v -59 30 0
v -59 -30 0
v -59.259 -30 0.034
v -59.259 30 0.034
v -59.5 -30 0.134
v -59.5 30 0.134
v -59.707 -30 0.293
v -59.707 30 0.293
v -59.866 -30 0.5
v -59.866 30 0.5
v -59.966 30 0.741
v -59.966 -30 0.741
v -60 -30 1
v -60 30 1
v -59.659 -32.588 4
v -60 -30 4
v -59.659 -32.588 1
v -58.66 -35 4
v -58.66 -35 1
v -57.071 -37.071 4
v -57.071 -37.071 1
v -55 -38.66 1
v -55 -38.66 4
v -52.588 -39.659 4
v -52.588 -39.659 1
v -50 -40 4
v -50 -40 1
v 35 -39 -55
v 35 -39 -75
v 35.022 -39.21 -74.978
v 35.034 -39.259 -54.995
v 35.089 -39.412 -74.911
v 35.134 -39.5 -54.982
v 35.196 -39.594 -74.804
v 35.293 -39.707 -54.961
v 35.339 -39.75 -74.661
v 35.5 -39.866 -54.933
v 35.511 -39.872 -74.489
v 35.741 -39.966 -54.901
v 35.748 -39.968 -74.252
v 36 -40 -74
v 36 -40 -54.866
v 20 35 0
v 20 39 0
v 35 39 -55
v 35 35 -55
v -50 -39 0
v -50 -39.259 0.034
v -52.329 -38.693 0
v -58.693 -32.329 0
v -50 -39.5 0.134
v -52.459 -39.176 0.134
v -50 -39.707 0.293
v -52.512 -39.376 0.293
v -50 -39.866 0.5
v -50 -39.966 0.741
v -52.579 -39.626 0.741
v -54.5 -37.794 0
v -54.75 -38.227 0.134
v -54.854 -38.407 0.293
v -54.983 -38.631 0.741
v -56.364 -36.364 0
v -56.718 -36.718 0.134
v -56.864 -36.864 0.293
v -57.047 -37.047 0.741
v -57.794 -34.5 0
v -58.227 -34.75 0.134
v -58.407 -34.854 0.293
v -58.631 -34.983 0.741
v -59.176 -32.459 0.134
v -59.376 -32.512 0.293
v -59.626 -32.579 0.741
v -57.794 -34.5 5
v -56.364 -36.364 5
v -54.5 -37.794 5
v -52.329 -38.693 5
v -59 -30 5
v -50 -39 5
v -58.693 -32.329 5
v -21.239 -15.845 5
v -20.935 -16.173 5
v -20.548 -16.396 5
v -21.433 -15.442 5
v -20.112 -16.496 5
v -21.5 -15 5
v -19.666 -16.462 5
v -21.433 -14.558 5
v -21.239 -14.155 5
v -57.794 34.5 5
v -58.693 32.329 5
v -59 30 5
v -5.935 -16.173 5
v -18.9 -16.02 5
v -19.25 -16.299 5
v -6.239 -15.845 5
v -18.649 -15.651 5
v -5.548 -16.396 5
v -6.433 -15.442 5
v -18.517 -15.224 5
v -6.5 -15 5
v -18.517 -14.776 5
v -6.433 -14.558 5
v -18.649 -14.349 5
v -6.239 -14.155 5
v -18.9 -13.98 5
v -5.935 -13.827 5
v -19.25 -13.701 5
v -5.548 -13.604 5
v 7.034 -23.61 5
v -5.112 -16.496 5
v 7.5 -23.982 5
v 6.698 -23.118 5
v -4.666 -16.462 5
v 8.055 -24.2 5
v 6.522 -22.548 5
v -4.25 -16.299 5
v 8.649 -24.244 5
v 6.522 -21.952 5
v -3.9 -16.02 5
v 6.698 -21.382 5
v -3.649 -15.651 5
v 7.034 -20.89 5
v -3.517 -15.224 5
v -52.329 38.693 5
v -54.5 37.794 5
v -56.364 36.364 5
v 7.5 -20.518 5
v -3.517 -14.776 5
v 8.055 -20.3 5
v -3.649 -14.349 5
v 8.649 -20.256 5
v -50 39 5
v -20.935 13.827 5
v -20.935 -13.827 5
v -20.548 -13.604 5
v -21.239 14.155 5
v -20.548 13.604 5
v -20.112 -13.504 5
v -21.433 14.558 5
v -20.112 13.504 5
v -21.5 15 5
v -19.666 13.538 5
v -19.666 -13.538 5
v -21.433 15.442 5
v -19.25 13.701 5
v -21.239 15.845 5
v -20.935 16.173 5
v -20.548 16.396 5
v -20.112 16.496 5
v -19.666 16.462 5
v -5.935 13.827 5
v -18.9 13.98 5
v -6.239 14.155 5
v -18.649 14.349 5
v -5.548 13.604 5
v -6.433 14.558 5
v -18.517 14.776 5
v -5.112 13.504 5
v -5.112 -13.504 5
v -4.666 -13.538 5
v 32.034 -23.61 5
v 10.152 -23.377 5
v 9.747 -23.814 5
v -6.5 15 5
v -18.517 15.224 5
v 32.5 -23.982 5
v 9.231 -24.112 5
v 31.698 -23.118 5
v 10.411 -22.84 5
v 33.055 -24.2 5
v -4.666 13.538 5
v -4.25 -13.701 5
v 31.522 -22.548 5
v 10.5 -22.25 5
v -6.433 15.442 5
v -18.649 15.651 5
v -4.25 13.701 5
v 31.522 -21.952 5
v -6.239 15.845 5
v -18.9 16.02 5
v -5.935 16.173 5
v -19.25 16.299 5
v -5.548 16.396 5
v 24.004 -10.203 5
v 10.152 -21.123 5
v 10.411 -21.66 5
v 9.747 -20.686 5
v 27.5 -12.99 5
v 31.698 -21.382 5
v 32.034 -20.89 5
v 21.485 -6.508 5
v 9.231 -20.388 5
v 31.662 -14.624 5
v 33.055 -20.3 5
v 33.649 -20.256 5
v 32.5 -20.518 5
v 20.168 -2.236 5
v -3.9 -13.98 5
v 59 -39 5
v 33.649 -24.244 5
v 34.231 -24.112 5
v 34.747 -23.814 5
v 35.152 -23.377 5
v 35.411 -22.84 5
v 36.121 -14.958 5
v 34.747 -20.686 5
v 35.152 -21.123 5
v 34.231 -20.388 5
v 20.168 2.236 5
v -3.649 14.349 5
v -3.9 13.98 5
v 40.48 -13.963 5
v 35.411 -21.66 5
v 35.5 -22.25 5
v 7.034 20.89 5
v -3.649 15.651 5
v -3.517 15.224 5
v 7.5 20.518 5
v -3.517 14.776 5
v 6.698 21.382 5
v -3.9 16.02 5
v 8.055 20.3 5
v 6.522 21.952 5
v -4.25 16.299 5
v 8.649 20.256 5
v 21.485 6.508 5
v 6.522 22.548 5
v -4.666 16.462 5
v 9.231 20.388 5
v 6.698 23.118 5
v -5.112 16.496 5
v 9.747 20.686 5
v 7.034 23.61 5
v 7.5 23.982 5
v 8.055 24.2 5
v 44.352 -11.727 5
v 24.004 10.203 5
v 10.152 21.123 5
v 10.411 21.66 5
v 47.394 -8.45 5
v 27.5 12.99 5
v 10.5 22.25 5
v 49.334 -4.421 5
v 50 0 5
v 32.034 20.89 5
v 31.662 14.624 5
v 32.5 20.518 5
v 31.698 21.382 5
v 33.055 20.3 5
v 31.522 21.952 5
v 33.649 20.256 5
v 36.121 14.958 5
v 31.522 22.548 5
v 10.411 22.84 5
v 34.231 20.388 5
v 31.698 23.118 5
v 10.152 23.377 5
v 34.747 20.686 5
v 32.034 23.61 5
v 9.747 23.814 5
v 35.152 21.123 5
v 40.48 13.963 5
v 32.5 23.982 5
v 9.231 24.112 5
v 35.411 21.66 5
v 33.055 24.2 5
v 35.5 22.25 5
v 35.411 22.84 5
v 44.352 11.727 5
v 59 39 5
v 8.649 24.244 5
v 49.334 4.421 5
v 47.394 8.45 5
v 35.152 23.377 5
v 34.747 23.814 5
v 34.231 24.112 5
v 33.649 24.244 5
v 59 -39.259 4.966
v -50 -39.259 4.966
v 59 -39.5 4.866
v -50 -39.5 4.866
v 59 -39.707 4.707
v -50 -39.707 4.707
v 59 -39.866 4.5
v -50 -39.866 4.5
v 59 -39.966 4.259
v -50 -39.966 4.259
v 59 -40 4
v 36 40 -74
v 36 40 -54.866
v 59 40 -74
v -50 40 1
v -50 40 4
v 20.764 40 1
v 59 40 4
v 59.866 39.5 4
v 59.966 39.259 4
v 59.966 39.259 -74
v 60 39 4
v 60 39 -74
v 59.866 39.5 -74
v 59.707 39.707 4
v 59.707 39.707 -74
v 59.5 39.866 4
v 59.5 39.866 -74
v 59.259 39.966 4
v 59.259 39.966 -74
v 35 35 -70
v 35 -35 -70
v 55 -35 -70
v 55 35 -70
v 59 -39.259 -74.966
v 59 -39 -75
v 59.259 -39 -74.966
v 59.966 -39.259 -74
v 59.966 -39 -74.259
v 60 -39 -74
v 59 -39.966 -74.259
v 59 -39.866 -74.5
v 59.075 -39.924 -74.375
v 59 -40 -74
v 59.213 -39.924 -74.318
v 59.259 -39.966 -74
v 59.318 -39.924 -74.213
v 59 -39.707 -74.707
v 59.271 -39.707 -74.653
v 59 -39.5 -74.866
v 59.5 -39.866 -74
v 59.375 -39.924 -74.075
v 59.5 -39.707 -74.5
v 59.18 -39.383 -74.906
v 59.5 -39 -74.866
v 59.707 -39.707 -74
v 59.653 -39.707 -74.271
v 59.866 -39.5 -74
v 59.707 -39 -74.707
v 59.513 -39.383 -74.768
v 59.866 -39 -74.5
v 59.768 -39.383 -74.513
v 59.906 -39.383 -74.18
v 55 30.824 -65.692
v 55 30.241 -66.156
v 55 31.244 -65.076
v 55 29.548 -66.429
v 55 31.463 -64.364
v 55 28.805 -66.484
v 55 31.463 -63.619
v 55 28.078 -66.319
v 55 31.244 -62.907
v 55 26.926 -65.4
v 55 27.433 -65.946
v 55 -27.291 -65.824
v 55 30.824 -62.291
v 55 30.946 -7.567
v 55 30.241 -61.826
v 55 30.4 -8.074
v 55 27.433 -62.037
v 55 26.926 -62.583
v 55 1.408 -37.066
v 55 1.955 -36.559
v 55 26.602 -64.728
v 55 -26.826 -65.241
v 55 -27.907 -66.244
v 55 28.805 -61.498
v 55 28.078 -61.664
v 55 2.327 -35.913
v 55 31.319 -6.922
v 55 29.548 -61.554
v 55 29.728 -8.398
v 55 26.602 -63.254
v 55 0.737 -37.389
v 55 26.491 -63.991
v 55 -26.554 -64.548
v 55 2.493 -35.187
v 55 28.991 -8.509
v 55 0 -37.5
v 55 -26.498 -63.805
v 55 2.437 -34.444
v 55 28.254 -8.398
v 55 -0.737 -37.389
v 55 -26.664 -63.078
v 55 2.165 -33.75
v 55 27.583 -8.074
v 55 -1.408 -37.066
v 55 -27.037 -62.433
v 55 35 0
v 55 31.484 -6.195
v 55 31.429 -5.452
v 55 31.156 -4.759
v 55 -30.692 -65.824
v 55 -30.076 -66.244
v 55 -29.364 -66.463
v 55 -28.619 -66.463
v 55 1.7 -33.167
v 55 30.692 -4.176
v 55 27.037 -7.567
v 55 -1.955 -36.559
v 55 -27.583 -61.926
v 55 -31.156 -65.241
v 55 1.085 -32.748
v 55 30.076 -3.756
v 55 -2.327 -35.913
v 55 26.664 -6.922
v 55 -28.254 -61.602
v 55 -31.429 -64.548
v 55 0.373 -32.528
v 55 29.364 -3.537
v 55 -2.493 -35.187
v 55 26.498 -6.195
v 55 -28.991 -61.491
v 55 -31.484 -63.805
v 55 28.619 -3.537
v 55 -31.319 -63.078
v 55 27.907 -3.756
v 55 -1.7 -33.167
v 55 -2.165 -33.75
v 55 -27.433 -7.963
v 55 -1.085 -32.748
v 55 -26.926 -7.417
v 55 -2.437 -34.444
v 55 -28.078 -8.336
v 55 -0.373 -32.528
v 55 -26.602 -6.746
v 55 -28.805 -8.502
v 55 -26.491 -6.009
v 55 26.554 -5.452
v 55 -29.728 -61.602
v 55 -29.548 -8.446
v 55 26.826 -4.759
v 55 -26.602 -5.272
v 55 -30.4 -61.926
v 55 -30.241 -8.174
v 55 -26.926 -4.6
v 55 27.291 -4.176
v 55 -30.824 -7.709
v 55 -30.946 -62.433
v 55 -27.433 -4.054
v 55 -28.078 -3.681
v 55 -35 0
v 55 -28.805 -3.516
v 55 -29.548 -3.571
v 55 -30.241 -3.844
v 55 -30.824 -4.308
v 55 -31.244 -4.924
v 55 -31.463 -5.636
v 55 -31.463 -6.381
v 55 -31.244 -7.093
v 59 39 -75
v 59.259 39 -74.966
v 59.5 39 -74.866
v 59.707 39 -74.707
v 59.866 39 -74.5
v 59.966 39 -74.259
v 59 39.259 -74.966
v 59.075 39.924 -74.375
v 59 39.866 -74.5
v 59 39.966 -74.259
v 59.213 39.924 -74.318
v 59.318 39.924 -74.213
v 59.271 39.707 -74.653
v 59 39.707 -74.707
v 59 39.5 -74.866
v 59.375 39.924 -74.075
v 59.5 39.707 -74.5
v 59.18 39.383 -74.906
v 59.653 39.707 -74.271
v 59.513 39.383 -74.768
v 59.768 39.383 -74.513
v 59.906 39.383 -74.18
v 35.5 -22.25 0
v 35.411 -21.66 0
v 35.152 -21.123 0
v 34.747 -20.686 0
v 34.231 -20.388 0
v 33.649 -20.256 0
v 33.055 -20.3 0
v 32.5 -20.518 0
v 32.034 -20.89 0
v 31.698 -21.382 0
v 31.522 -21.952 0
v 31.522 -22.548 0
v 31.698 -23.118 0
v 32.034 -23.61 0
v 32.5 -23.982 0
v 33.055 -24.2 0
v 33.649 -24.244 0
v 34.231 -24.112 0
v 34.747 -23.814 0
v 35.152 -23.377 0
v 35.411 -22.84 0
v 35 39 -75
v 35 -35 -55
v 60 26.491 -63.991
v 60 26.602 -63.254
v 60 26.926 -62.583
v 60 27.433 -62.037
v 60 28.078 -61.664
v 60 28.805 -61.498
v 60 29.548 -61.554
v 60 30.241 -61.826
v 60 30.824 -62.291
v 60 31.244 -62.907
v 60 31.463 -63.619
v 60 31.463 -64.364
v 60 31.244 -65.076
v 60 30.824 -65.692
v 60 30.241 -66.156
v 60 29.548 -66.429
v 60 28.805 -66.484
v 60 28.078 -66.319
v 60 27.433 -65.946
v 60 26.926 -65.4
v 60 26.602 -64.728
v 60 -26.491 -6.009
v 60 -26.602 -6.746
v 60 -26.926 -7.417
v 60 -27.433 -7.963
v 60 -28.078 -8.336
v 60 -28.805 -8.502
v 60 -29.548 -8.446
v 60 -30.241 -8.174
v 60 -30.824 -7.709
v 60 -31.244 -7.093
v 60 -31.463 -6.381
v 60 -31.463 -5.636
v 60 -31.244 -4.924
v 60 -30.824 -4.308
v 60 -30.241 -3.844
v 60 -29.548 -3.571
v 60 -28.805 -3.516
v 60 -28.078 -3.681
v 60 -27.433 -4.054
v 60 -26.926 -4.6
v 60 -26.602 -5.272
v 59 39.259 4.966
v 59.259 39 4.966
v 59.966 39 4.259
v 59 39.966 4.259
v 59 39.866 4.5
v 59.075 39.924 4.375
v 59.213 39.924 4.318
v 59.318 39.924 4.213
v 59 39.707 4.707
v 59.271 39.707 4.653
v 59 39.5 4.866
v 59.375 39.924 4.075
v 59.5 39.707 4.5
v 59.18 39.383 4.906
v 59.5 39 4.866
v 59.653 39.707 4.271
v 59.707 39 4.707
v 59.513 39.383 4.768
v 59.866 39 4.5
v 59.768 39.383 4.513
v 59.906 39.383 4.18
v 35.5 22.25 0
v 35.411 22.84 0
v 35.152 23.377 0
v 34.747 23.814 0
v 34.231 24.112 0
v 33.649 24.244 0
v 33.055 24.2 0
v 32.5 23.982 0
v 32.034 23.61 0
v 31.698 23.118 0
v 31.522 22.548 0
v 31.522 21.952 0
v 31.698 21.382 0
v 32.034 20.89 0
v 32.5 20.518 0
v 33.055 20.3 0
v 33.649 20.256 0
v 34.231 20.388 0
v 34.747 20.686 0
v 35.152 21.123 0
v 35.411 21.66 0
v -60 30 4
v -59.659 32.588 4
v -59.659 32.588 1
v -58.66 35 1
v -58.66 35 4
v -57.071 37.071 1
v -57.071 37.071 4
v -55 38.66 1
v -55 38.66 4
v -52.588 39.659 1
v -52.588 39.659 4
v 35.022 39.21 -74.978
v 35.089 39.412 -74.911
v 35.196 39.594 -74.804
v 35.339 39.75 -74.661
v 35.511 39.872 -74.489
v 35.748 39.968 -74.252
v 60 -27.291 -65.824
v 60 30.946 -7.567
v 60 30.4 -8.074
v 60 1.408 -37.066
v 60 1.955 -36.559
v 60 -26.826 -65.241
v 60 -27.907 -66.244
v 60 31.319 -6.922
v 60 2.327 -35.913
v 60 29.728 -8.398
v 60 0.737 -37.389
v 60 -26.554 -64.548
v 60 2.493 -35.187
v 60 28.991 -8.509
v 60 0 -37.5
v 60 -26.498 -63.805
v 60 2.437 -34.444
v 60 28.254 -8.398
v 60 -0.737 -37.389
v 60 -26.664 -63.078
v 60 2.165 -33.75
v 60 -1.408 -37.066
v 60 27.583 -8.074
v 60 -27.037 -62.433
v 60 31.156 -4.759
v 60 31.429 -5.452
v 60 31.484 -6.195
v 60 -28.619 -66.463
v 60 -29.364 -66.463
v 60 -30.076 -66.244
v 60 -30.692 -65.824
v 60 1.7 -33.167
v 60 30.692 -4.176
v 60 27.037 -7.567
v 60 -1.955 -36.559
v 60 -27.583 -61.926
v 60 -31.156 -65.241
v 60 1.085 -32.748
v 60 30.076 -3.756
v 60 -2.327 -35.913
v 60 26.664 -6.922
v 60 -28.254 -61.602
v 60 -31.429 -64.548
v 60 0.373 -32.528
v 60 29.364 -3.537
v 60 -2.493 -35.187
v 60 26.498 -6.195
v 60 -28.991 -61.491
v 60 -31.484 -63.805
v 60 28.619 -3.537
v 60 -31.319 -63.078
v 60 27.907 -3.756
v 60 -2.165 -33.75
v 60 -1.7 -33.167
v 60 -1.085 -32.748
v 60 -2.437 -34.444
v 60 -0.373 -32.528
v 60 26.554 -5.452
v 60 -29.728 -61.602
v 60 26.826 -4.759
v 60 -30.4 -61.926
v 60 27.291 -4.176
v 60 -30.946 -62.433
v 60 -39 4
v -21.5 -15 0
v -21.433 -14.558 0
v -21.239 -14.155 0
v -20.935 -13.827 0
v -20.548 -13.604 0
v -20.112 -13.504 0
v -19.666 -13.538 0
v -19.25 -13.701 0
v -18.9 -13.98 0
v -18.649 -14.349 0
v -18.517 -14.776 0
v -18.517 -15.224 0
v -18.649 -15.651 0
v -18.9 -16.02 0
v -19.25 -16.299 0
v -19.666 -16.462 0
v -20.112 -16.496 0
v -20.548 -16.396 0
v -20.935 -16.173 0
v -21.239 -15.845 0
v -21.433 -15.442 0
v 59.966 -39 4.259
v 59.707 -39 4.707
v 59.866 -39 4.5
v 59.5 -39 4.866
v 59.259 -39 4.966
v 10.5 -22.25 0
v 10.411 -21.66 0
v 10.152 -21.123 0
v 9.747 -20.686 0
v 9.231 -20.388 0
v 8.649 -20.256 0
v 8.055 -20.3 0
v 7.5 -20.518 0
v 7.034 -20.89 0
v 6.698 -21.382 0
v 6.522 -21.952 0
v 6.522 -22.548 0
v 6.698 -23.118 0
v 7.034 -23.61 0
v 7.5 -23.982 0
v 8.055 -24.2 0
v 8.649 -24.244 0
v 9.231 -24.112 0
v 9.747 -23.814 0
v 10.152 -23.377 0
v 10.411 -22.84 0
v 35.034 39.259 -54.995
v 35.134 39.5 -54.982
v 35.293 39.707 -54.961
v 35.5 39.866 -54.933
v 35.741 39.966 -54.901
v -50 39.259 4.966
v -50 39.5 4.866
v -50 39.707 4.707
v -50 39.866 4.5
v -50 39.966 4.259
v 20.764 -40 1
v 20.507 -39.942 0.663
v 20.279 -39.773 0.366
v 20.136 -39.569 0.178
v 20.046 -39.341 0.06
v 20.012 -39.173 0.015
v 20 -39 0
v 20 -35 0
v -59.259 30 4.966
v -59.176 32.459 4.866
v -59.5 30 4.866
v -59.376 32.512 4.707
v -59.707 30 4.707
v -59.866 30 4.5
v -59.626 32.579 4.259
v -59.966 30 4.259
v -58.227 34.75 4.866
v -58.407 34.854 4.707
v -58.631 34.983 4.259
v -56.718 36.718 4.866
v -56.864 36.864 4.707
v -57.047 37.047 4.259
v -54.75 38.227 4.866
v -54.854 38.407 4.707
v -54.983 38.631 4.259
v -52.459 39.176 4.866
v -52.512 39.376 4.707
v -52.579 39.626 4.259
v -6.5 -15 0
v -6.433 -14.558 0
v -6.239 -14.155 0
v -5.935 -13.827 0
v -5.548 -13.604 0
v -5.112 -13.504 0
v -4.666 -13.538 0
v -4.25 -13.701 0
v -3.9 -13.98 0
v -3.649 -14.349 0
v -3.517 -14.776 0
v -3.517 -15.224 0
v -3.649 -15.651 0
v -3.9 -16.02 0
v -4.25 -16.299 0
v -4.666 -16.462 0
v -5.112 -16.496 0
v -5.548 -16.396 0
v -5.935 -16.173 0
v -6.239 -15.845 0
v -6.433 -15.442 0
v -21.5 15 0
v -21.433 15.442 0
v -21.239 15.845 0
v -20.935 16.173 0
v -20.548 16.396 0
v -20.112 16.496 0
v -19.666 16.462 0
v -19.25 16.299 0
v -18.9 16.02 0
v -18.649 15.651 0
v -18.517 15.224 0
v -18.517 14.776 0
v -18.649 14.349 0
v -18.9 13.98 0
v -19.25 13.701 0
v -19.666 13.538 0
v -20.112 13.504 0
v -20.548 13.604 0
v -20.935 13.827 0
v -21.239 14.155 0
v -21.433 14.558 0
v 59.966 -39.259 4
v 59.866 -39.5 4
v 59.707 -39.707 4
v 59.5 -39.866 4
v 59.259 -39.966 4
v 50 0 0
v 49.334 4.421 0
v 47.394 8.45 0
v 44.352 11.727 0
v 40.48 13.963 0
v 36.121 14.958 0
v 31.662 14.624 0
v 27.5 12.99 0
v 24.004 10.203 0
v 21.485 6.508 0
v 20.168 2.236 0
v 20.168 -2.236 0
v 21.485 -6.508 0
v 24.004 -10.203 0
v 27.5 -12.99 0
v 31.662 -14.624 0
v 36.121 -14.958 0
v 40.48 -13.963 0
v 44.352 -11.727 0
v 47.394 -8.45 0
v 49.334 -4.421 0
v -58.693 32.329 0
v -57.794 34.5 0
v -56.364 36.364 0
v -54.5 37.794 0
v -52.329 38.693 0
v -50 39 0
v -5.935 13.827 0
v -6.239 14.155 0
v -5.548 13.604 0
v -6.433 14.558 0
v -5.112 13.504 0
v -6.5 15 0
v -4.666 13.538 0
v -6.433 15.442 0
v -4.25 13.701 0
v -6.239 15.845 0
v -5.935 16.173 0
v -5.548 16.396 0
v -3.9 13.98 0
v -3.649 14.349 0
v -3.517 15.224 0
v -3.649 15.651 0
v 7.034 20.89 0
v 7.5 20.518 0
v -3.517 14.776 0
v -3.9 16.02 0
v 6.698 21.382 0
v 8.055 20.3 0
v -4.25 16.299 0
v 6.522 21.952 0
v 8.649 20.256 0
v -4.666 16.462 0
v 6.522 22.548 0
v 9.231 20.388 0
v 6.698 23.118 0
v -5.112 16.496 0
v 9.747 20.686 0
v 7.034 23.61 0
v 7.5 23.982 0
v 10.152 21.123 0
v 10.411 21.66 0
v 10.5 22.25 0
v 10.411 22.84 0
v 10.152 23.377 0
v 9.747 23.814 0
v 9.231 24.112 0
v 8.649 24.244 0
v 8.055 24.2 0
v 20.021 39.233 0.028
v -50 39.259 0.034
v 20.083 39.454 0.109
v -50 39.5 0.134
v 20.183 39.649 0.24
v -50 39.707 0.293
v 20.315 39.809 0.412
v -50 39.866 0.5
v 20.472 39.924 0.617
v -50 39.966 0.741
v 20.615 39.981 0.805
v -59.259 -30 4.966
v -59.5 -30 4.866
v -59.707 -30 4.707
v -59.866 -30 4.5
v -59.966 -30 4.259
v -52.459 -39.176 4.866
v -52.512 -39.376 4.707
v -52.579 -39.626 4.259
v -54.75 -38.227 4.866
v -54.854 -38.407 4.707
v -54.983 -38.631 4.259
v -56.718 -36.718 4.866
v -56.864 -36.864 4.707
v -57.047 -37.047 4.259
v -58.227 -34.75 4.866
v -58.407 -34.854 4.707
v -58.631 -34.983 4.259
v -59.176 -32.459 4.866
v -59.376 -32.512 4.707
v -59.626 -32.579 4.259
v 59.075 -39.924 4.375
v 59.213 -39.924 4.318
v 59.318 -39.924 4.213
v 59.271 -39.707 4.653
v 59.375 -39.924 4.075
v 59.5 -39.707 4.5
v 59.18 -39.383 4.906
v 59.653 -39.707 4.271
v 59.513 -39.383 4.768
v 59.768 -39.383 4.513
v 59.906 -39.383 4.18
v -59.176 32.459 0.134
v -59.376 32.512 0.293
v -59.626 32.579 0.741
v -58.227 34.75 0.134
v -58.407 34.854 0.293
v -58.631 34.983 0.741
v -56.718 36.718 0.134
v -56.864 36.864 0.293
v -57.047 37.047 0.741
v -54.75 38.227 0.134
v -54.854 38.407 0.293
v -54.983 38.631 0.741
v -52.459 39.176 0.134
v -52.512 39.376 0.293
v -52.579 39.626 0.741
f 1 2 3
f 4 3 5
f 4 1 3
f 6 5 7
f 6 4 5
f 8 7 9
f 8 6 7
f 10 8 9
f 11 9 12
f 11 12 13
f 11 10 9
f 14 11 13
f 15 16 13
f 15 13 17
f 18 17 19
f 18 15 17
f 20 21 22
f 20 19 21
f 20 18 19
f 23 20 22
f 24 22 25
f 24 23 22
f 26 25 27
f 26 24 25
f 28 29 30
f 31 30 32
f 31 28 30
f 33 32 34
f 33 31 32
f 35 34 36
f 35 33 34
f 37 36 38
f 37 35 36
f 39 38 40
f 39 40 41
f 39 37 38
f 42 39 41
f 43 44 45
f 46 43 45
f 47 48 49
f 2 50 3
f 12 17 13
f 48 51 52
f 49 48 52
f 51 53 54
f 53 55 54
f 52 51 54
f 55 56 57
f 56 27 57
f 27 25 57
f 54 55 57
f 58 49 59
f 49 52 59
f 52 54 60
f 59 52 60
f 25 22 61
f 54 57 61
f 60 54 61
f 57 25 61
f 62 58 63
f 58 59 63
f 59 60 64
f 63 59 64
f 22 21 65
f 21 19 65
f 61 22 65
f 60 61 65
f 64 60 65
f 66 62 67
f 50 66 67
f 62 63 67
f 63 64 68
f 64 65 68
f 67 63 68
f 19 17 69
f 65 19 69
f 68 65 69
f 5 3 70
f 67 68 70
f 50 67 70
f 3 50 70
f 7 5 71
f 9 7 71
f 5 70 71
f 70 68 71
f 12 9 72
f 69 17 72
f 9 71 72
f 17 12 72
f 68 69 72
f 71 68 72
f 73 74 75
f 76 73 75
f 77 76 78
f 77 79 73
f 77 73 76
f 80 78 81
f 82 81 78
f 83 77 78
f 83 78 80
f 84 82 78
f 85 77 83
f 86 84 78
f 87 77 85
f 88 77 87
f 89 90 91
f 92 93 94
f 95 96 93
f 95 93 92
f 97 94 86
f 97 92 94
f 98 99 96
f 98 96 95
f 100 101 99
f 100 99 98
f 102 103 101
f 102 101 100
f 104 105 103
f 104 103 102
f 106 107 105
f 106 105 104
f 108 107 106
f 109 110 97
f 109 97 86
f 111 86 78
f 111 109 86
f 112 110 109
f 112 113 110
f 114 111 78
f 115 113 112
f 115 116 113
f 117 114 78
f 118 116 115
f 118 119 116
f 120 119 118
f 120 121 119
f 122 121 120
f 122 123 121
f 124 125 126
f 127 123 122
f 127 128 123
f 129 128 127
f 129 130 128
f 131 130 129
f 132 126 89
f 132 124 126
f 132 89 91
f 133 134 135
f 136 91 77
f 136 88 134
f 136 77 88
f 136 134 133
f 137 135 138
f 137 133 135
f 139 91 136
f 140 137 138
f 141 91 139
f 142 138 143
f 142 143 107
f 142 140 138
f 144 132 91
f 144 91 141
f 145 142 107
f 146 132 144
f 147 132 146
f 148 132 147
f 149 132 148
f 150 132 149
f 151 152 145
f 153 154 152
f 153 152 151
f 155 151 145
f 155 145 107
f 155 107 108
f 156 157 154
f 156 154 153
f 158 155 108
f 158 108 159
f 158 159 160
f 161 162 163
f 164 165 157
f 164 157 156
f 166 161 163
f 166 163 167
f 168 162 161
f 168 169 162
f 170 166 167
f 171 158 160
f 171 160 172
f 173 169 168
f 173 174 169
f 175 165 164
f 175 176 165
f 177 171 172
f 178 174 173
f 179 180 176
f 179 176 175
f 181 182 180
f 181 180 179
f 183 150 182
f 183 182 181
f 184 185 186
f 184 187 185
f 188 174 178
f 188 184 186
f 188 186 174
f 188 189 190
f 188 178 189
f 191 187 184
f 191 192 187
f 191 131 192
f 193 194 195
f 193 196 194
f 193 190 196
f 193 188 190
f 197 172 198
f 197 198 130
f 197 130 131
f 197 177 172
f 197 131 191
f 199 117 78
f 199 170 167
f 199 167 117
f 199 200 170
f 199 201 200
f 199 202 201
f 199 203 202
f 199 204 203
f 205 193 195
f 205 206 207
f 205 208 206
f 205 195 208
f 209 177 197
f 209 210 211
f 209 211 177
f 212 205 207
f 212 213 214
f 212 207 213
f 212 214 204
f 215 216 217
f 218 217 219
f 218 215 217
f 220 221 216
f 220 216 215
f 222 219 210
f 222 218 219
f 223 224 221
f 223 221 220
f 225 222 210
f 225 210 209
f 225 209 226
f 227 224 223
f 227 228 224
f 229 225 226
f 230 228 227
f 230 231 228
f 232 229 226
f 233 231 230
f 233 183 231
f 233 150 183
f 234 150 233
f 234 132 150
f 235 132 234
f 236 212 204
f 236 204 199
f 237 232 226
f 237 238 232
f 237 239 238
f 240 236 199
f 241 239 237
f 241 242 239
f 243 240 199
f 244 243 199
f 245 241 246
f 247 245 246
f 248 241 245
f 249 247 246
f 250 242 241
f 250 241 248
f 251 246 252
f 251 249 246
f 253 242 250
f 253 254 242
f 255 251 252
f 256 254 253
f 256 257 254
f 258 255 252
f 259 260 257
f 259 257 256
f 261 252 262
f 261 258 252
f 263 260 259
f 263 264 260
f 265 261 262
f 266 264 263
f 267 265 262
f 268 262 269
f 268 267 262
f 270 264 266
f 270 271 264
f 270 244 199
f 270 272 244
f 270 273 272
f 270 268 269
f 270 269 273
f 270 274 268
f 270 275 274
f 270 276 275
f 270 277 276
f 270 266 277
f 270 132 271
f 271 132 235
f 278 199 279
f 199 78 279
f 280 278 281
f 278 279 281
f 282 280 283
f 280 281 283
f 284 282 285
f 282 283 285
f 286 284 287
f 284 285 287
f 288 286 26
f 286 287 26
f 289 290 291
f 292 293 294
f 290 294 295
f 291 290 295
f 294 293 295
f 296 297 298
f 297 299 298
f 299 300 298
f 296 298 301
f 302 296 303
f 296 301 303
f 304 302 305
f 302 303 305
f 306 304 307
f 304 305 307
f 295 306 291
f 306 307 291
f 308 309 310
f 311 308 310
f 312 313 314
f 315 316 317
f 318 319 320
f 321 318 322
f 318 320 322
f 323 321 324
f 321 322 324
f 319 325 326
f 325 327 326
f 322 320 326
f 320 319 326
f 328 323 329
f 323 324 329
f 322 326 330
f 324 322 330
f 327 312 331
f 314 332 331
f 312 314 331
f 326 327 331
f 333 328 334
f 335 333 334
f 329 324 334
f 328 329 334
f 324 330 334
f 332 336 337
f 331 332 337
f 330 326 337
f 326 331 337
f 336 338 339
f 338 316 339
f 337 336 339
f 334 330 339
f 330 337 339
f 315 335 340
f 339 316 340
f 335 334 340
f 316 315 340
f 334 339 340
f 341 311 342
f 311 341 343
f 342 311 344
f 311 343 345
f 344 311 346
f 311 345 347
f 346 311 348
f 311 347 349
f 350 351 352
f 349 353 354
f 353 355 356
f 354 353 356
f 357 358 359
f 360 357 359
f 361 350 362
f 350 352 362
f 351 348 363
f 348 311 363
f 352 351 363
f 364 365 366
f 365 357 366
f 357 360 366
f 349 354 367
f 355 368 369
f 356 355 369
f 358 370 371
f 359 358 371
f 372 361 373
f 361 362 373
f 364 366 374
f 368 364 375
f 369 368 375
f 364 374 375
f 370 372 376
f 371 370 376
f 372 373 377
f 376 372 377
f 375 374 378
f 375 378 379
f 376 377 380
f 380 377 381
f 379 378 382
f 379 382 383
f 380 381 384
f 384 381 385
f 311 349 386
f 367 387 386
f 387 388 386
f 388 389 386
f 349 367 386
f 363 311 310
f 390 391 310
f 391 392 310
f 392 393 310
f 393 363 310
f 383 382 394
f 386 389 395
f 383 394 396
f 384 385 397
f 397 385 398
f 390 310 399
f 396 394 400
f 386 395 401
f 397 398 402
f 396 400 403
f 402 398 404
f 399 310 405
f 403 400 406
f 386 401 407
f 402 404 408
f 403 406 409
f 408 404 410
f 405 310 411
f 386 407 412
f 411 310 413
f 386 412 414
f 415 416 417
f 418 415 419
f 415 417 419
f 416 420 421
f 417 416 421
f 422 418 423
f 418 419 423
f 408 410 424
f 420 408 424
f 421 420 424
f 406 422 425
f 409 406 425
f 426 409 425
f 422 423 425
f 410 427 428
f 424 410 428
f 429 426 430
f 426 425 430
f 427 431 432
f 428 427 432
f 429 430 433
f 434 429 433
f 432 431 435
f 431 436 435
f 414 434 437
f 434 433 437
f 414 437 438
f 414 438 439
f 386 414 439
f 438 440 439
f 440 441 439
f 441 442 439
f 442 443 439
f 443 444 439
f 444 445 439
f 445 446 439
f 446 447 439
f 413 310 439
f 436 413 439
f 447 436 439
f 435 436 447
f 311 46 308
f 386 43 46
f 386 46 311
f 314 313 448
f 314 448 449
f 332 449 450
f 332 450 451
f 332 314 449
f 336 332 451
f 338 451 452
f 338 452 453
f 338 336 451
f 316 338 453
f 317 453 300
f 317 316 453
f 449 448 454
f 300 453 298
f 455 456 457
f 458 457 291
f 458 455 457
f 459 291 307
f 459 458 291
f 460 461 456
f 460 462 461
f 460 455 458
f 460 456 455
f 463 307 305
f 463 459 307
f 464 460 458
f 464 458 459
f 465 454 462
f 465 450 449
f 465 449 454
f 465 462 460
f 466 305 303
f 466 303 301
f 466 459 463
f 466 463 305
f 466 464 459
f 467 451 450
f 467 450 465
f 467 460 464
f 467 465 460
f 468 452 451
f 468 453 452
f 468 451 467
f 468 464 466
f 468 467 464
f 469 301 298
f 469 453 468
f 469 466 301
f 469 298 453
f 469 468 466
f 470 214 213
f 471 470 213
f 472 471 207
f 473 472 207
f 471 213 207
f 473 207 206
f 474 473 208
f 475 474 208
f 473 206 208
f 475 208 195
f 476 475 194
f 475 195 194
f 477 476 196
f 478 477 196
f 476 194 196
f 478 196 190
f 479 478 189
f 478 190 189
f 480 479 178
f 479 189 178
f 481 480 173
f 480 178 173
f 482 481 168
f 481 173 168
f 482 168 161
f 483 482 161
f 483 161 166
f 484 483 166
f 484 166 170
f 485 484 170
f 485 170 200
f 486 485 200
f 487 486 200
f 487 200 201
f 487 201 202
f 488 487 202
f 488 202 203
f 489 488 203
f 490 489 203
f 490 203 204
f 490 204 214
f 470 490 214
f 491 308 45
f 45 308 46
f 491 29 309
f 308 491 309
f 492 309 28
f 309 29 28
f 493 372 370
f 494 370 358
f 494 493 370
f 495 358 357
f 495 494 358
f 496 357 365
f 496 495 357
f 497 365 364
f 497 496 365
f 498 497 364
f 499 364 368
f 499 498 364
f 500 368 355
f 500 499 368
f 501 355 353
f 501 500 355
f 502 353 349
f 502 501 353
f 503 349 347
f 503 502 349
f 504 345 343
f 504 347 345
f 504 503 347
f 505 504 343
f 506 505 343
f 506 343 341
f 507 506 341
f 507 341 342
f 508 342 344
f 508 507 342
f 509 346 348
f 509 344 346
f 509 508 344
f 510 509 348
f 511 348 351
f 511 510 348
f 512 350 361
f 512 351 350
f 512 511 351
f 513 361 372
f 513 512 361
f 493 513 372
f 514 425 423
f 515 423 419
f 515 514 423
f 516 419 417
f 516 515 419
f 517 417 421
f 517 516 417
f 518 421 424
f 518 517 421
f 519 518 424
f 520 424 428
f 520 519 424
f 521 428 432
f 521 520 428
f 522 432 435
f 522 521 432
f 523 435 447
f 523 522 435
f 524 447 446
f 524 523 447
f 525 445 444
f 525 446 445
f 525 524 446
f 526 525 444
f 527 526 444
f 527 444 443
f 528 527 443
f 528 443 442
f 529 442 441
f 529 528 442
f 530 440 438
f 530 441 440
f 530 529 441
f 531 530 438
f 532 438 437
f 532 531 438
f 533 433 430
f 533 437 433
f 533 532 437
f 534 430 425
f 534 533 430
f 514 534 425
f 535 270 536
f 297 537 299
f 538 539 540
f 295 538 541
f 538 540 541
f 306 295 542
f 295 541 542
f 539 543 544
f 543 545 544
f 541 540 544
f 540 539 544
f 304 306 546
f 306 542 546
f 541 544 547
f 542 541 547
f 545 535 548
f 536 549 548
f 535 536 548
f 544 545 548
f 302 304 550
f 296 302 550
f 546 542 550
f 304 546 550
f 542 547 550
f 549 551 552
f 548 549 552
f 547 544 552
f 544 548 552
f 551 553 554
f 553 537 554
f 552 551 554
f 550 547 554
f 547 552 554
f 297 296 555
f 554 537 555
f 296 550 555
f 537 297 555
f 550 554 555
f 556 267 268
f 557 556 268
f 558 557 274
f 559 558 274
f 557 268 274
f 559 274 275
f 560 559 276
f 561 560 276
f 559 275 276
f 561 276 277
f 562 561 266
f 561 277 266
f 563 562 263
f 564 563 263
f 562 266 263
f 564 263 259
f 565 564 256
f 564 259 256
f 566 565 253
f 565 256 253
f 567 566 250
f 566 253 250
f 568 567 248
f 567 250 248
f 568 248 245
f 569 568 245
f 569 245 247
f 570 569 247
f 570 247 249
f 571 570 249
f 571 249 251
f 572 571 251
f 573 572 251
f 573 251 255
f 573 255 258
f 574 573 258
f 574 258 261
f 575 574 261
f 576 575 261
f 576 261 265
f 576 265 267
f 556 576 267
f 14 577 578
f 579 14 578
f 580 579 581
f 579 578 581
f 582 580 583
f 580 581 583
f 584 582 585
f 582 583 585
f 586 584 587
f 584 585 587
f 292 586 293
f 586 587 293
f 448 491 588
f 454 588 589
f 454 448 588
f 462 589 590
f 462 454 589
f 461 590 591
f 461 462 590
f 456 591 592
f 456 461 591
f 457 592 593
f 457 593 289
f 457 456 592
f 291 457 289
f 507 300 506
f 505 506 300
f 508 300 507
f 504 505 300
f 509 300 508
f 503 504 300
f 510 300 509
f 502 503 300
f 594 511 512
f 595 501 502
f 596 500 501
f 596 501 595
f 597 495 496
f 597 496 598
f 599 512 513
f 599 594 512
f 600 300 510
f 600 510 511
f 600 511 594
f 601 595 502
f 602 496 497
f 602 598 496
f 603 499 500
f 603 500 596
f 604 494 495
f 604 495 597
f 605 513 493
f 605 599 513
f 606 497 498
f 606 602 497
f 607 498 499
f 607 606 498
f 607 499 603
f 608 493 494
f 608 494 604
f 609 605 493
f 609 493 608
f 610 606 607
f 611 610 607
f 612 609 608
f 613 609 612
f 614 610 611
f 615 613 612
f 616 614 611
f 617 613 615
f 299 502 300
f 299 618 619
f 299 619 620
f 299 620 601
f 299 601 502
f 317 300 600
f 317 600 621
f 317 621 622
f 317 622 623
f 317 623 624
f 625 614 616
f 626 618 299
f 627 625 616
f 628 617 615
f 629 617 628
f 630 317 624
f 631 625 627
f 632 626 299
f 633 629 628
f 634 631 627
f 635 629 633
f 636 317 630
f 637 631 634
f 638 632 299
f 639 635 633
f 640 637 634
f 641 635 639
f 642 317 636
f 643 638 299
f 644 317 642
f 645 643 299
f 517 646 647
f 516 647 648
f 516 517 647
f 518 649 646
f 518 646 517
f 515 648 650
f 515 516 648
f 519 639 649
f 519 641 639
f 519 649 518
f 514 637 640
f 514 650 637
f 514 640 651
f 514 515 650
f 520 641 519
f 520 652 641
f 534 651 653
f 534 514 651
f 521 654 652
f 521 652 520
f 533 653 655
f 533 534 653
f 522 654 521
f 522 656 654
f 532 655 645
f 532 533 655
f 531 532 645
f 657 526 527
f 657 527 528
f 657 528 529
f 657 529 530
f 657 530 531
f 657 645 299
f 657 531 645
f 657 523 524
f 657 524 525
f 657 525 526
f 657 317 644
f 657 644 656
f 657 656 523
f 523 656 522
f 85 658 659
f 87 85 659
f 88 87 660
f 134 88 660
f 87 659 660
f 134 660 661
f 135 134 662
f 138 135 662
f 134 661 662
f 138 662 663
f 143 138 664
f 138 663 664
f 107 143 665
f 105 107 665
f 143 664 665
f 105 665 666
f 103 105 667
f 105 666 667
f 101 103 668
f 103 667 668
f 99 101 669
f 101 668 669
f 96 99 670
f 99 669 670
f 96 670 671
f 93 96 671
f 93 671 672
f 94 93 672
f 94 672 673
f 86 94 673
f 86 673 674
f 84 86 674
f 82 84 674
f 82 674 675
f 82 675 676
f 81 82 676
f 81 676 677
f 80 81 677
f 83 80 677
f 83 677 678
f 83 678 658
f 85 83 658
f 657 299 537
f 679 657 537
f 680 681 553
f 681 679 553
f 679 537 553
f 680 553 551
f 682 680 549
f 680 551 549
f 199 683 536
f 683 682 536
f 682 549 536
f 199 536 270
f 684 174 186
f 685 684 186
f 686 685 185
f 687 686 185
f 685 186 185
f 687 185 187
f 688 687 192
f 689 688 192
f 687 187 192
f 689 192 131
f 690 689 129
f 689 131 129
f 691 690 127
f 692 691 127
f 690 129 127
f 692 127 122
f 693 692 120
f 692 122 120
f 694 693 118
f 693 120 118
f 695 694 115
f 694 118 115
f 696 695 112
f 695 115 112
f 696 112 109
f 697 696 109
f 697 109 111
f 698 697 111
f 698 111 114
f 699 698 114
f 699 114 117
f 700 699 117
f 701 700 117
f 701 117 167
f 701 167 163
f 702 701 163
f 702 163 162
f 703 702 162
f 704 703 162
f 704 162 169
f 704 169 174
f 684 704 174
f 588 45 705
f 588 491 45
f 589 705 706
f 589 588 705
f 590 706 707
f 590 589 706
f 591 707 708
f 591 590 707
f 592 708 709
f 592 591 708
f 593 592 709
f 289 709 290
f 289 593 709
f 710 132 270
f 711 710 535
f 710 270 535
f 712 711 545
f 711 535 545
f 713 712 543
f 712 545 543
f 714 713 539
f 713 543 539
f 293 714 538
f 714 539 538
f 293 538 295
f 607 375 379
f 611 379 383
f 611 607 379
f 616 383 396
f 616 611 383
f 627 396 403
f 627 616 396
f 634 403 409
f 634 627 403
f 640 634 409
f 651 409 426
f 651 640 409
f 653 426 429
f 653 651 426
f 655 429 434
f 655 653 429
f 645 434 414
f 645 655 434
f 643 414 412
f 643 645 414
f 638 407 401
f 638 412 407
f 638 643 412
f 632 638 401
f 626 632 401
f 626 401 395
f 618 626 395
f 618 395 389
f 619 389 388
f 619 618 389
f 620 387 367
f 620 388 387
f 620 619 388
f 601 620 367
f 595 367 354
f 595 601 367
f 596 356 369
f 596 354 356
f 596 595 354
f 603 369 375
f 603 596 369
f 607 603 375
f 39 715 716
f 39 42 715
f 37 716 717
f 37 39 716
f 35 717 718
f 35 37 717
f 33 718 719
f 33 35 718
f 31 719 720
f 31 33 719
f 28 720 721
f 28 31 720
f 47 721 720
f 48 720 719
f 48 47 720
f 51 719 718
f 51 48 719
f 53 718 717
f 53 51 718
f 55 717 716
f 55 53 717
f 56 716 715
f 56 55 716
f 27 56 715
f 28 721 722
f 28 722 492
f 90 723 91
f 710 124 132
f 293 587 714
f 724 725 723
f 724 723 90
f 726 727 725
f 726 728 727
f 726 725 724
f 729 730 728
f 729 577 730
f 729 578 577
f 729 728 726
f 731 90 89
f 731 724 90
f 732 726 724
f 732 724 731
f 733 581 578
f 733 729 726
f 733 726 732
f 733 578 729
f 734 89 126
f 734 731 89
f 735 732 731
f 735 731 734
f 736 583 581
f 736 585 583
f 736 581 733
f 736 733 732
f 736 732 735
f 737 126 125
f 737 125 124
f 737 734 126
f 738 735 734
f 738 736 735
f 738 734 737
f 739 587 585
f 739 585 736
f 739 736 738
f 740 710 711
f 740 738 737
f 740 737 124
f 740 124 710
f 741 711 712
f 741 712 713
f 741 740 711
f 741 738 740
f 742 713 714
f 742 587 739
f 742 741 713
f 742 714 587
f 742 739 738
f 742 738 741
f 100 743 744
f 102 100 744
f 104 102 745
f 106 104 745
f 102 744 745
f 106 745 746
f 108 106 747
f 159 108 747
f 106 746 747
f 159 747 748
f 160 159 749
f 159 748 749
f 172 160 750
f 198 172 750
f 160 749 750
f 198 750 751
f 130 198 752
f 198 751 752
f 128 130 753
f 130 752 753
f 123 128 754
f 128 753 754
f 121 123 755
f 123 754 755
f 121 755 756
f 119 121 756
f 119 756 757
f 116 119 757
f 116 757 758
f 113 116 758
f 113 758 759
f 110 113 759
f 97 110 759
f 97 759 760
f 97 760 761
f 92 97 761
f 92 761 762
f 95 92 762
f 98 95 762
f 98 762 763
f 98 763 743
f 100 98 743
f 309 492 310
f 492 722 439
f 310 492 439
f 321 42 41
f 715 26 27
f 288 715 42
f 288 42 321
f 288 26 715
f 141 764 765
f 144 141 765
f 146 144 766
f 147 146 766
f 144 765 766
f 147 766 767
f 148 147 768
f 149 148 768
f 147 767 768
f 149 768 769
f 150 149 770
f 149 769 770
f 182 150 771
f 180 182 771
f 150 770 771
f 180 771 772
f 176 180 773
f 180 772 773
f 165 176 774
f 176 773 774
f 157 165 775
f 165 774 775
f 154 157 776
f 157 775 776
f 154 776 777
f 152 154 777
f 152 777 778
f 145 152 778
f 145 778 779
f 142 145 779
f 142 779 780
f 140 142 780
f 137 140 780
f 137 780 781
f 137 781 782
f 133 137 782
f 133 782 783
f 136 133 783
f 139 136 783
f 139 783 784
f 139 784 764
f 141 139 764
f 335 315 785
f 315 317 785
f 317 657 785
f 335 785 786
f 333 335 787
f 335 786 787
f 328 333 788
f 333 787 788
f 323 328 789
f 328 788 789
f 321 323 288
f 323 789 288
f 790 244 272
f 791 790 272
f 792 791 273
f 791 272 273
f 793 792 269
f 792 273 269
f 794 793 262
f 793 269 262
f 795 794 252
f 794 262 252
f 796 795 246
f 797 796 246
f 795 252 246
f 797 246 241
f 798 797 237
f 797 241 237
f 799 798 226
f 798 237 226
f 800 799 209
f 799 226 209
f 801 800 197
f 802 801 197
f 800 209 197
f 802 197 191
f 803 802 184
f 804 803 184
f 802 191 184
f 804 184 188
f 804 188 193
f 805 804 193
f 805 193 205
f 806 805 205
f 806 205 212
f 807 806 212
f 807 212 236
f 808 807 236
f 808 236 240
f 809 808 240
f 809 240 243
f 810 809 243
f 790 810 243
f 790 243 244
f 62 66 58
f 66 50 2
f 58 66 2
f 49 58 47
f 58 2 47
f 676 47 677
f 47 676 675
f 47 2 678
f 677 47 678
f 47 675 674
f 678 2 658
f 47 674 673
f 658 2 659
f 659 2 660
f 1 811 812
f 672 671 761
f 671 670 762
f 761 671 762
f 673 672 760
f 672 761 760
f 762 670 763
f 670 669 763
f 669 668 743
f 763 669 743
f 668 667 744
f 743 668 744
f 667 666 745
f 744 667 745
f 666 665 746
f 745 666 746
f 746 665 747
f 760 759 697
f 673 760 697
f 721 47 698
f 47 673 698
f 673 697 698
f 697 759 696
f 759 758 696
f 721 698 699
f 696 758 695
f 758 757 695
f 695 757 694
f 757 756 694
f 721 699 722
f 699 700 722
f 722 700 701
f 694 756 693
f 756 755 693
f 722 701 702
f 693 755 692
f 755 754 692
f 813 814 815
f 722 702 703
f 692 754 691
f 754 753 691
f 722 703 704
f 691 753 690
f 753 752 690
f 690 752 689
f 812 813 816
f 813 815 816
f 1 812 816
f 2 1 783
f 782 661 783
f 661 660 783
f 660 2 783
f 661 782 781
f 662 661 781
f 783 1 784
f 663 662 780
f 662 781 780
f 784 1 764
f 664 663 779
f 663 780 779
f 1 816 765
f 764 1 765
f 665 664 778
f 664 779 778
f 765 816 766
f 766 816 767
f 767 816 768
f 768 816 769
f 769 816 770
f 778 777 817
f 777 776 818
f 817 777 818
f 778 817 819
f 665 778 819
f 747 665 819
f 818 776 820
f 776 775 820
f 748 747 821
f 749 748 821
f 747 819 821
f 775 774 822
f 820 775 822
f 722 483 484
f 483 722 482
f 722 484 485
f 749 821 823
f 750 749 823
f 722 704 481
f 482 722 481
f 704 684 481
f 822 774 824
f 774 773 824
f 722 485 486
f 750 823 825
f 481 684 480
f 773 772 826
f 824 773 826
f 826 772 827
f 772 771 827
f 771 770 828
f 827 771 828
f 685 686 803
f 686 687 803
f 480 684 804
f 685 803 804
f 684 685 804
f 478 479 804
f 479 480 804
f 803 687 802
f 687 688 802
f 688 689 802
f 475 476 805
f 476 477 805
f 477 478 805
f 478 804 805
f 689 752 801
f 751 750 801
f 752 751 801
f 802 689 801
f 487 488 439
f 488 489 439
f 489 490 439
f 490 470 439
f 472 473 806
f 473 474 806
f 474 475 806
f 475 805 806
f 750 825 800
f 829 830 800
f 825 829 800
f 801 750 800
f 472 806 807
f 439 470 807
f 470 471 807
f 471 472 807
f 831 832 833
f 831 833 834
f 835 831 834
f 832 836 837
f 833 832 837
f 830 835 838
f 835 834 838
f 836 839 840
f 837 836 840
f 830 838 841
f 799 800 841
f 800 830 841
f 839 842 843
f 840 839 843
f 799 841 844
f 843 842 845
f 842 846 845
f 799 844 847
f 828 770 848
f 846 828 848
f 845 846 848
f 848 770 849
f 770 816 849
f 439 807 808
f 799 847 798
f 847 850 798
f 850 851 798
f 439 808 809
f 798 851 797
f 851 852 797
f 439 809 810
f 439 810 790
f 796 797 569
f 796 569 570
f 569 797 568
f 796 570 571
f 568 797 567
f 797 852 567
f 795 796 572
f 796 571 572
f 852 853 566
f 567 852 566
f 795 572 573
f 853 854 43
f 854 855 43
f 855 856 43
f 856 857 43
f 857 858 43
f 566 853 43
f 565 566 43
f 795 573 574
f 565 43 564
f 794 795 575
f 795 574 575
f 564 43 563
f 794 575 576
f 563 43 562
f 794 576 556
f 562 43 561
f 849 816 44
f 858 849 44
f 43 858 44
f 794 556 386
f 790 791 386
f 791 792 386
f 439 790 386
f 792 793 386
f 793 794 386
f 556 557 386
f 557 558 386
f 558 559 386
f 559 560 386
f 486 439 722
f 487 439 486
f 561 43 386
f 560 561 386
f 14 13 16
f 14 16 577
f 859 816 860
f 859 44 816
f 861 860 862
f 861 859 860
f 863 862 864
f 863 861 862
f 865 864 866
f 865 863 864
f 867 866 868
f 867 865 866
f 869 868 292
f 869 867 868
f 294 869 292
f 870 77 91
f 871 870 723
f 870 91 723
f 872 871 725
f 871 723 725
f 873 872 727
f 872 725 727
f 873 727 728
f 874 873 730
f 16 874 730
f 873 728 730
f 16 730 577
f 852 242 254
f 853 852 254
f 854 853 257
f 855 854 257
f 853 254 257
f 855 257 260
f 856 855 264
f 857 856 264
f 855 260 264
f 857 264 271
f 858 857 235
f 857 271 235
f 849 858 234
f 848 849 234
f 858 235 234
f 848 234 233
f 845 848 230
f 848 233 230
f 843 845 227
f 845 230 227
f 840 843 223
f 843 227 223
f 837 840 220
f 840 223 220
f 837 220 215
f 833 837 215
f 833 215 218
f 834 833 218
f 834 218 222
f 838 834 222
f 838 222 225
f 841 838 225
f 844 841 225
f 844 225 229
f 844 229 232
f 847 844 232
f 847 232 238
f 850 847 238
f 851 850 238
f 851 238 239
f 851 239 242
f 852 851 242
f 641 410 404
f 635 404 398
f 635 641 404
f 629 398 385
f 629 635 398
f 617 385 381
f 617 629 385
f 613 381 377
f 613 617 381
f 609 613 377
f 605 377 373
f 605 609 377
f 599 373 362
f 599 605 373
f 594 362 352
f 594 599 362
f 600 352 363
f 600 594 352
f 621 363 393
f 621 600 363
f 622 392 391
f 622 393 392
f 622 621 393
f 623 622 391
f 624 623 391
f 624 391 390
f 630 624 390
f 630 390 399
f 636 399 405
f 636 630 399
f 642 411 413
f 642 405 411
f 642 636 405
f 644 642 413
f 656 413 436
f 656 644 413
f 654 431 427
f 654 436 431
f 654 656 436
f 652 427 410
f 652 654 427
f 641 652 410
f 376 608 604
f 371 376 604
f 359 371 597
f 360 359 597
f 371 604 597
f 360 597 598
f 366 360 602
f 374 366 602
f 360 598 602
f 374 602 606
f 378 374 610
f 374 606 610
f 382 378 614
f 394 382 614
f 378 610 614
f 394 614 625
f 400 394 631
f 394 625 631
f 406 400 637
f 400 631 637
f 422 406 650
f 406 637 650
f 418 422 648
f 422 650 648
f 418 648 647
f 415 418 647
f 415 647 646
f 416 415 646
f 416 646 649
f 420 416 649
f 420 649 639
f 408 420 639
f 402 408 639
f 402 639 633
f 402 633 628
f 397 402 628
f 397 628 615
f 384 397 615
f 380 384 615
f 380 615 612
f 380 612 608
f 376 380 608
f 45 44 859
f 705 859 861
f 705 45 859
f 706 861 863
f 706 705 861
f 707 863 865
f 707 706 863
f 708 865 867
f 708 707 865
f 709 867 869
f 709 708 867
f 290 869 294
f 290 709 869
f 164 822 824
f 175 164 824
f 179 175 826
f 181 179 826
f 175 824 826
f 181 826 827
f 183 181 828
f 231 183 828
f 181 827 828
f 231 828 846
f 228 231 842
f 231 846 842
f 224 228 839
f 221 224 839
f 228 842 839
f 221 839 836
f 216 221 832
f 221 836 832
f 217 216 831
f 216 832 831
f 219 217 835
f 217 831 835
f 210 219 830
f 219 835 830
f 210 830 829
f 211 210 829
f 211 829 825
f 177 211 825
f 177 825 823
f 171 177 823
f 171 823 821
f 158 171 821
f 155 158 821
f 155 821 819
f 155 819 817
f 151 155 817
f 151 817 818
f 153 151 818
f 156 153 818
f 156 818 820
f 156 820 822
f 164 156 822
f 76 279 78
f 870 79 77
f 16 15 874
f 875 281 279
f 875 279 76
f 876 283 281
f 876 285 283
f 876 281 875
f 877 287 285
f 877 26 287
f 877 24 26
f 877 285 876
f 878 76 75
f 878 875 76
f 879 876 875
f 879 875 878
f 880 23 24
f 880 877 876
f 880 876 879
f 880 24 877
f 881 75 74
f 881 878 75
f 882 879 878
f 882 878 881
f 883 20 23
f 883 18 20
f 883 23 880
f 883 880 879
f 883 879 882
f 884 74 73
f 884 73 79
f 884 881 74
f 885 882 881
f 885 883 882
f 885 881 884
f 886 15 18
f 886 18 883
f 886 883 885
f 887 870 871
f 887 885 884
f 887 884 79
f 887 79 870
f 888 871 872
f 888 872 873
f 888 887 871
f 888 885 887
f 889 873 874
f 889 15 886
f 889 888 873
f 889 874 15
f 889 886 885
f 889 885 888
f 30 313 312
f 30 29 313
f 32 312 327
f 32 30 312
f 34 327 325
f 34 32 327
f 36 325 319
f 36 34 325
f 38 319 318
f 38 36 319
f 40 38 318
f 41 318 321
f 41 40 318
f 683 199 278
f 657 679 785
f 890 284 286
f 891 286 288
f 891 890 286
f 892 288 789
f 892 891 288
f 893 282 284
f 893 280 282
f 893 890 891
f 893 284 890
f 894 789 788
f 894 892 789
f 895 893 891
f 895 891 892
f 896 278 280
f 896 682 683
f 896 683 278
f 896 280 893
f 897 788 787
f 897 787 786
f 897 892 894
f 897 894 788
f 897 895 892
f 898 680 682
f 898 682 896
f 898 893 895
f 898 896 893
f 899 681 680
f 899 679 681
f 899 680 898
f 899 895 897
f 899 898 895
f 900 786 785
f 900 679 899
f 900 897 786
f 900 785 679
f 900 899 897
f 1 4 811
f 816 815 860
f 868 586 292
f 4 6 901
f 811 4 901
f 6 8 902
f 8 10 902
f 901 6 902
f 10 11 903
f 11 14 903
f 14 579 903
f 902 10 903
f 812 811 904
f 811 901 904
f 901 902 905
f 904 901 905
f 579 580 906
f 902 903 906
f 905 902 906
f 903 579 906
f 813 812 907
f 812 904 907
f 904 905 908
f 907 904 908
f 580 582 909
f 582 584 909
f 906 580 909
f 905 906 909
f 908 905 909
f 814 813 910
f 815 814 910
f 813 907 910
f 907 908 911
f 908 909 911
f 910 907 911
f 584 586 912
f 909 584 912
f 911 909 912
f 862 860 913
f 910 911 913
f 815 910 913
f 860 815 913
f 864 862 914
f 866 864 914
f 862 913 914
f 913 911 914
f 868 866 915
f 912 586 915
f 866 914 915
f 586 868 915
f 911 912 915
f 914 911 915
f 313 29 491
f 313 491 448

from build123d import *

# Parameters (mm, degrees)
SKETCH_1_W               = 120
SKETCH_1_H               = 80
EXTRUDE_1_DEPTH          = 5
SKETCH_3_R               = 4
CUT_EXTRUDE_2_DEPTH      = 10
SKETCH_5_R               = 15
CUT_EXTRUDE_3_DEPTH      = 10
F_4_0MM_1_D              = 4
FILLET_1_R               = 10
SKETCH_13_R              = 6.969385005
EXTRUDE_5_DEPTH          = 5
SKETCH_14_W              = 5
SKETCH_14_H              = 75
EXTRUDE_6_DEPTH          = 80
SKETCH_15_W              = 20
SKETCH_15_H              = 5
EXTRUDE_7_DEPTH          = 80
EXTRUDE_8_DEPTH          = 5
FILLET_2_R               = 1
F_3_0MM_1_D              = 3
F_3_0MM_1_DEPTH          = 7.5
F_3_0MM_1_TIP            = 0.901290929
SKETCH_21_R              = 2.5
CUT_EXTRUDE_7_DEPTH      = 10
PATTERN_CIRCULAR_1_COUNT = 4


with BuildPart() as part:
    # 草图1 → 凸台-拉伸1 (new body)
    with BuildSketch(Plane.XY):
        Rectangle(SKETCH_1_W, SKETCH_1_H)
    extrude(amount=EXTRUDE_1_DEPTH)

    # 草图3 → 切除-拉伸2 (cut)
    with BuildSketch(Plane.XY.offset(5)):
        with Locations((-45, 0)):
            Circle(SKETCH_3_R)
    extrude(amount=-CUT_EXTRUDE_2_DEPTH, mode=Mode.SUBTRACT)

    # 草图5 → 切除-拉伸3 (cut)
    with BuildSketch(Plane.XY.offset(5)):
        with Locations((35, 0)):
            Circle(SKETCH_5_R)
    extrude(amount=-CUT_EXTRUDE_3_DEPTH, mode=Mode.SUBTRACT)

    # Ø4.0mm 暗销孔1 (through all)
    with Locations(Plane(origin=(0, 0, 0), x_dir=(-1, 0, 0), z_dir=(0, 0, -1))):
        with Locations((-8.5, -22.25), (-8.5, 22.25), (-33.5, 22.25), (-33.5, -22.25)):
            Hole(F_4_0MM_1_D / 2)

    # 圆角1
    fillet_1_edges = [part.edges().sort_by_distance(p)[0] for p in [
        (-60, 40, 2.5),
        (-60, -40, 2.5),
    ]]
    fillet(fillet_1_edges, radius=FILLET_1_R)

    # 草图13 → 凸台-拉伸5 (add)
    with BuildSketch(Plane.XY.offset(5)):
        with Locations((-45, 0)):
            Circle(SKETCH_13_R)
    extrude(amount=-EXTRUDE_5_DEPTH)

    # 草图14 → 凸台-拉伸6 (add)
    with BuildSketch(Plane.XZ.offset(40)):
        with Locations((57.5, -37.5)):
            Rectangle(SKETCH_14_W, SKETCH_14_H)
    extrude(amount=-EXTRUDE_6_DEPTH)

    # 草图15 → 凸台-拉伸7 (add)
    with BuildSketch(Plane.XZ.offset(40)):
        with Locations((45, -72.5)):
            Rectangle(SKETCH_15_W, SKETCH_15_H)
    extrude(amount=-EXTRUDE_7_DEPTH)

    # 草图16 → 凸台-拉伸8 (add)
    with BuildSketch(Plane.XZ.offset(40)):
        Polygon((20, 5), (20, 0), (35, -55), (35, -75), (60, -75), (60, 5), align=None)
    extrude_8 = extrude(amount=-EXTRUDE_8_DEPTH)

    # 镜向1: 凸台-拉伸8 across plane
    add(extrude_8.mirror(Plane.ZX))

    # 圆角2
    fillet_2_edges = [part.edges().sort_by_distance(p)[0] for p in [
        (27.5, -40, -27.5),
        (-15, 40, 0),
        (60, 0, 5),
        (27.5, 40, -27.5),
        (5, 40, 5),
        (-15, -40, 0),
        (5, -40, 5),
        (-60, 0, 0),
        (-57.071067812, 37.071067812, 0),
        (-57.071067812, -37.071067812, 0),
        (-60, 0, 5),
        (-57.071067812, 37.071067812, 5),
        (-57.071067812, -37.071067812, 5),
        (60, 0, -75),
        (47.5, -40, -75),
        (47.5, 40, -75),
        (60, 40, -35),
        (60, -40, -35),
        (35, -40, -65),
        (35, 40, -65),
    ]]
    fillet(fillet_2_edges, radius=FILLET_2_R)

    # Ø3.0mm 暗销孔1
    with Locations(Plane.XY.offset(5)):
        with Locations((-5, -15), (-5, 15), (-20, 15), (-20, -15)):
            Hole(F_3_0MM_1_D / 2, depth=F_3_0MM_1_DEPTH)
            with Locations((0, 0, -(F_3_0MM_1_DEPTH + F_3_0MM_1_TIP / 2))):  # 118° drill point
                Cone(0, F_3_0MM_1_D / 2, F_3_0MM_1_TIP, mode=Mode.SUBTRACT)

    # 草图21 → 切除-拉伸7 (cut)
    with BuildSketch(Plane(origin=(60, 0, 0), x_dir=(0, 0, -1), z_dir=(1, 0, 0))):
        with Locations((35, 0)):
            Circle(SKETCH_21_R)
    extrude(amount=-CUT_EXTRUDE_7_DEPTH, mode=Mode.SUBTRACT)

    # 草图24 → Ø5.0mm 暗销孔1 (revolve, cut)
    with BuildSketch(Plane(origin=(60, 28.991378029, -6.008621971), x_dir=(0, 0, -1), z_dir=(0, 1, 0))):
        Polygon((0, 0), (0, 13.902151548), (2.5, 12.4), (2.5, 0), align=None)
    f_5_0mm_1 = revolve(axis=Axis((66.35, 28.991378029, -6.008621971), (-1, 0, 0)), mode=Mode.SUBTRACT)

    # 阵列(圆周)1: Ø5.0mm 暗销孔1 ×4 about axis
    pattern_circular_1_axis = Axis((0, 0, -35), (1, 0, 0))
    for i in range(1, PATTERN_CIRCULAR_1_COUNT):
        add(f_5_0mm_1.rotate(pattern_circular_1_axis, i * 360 / PATTERN_CIRCULAR_1_COUNT), mode=Mode.SUBTRACT)


solid = part.part
